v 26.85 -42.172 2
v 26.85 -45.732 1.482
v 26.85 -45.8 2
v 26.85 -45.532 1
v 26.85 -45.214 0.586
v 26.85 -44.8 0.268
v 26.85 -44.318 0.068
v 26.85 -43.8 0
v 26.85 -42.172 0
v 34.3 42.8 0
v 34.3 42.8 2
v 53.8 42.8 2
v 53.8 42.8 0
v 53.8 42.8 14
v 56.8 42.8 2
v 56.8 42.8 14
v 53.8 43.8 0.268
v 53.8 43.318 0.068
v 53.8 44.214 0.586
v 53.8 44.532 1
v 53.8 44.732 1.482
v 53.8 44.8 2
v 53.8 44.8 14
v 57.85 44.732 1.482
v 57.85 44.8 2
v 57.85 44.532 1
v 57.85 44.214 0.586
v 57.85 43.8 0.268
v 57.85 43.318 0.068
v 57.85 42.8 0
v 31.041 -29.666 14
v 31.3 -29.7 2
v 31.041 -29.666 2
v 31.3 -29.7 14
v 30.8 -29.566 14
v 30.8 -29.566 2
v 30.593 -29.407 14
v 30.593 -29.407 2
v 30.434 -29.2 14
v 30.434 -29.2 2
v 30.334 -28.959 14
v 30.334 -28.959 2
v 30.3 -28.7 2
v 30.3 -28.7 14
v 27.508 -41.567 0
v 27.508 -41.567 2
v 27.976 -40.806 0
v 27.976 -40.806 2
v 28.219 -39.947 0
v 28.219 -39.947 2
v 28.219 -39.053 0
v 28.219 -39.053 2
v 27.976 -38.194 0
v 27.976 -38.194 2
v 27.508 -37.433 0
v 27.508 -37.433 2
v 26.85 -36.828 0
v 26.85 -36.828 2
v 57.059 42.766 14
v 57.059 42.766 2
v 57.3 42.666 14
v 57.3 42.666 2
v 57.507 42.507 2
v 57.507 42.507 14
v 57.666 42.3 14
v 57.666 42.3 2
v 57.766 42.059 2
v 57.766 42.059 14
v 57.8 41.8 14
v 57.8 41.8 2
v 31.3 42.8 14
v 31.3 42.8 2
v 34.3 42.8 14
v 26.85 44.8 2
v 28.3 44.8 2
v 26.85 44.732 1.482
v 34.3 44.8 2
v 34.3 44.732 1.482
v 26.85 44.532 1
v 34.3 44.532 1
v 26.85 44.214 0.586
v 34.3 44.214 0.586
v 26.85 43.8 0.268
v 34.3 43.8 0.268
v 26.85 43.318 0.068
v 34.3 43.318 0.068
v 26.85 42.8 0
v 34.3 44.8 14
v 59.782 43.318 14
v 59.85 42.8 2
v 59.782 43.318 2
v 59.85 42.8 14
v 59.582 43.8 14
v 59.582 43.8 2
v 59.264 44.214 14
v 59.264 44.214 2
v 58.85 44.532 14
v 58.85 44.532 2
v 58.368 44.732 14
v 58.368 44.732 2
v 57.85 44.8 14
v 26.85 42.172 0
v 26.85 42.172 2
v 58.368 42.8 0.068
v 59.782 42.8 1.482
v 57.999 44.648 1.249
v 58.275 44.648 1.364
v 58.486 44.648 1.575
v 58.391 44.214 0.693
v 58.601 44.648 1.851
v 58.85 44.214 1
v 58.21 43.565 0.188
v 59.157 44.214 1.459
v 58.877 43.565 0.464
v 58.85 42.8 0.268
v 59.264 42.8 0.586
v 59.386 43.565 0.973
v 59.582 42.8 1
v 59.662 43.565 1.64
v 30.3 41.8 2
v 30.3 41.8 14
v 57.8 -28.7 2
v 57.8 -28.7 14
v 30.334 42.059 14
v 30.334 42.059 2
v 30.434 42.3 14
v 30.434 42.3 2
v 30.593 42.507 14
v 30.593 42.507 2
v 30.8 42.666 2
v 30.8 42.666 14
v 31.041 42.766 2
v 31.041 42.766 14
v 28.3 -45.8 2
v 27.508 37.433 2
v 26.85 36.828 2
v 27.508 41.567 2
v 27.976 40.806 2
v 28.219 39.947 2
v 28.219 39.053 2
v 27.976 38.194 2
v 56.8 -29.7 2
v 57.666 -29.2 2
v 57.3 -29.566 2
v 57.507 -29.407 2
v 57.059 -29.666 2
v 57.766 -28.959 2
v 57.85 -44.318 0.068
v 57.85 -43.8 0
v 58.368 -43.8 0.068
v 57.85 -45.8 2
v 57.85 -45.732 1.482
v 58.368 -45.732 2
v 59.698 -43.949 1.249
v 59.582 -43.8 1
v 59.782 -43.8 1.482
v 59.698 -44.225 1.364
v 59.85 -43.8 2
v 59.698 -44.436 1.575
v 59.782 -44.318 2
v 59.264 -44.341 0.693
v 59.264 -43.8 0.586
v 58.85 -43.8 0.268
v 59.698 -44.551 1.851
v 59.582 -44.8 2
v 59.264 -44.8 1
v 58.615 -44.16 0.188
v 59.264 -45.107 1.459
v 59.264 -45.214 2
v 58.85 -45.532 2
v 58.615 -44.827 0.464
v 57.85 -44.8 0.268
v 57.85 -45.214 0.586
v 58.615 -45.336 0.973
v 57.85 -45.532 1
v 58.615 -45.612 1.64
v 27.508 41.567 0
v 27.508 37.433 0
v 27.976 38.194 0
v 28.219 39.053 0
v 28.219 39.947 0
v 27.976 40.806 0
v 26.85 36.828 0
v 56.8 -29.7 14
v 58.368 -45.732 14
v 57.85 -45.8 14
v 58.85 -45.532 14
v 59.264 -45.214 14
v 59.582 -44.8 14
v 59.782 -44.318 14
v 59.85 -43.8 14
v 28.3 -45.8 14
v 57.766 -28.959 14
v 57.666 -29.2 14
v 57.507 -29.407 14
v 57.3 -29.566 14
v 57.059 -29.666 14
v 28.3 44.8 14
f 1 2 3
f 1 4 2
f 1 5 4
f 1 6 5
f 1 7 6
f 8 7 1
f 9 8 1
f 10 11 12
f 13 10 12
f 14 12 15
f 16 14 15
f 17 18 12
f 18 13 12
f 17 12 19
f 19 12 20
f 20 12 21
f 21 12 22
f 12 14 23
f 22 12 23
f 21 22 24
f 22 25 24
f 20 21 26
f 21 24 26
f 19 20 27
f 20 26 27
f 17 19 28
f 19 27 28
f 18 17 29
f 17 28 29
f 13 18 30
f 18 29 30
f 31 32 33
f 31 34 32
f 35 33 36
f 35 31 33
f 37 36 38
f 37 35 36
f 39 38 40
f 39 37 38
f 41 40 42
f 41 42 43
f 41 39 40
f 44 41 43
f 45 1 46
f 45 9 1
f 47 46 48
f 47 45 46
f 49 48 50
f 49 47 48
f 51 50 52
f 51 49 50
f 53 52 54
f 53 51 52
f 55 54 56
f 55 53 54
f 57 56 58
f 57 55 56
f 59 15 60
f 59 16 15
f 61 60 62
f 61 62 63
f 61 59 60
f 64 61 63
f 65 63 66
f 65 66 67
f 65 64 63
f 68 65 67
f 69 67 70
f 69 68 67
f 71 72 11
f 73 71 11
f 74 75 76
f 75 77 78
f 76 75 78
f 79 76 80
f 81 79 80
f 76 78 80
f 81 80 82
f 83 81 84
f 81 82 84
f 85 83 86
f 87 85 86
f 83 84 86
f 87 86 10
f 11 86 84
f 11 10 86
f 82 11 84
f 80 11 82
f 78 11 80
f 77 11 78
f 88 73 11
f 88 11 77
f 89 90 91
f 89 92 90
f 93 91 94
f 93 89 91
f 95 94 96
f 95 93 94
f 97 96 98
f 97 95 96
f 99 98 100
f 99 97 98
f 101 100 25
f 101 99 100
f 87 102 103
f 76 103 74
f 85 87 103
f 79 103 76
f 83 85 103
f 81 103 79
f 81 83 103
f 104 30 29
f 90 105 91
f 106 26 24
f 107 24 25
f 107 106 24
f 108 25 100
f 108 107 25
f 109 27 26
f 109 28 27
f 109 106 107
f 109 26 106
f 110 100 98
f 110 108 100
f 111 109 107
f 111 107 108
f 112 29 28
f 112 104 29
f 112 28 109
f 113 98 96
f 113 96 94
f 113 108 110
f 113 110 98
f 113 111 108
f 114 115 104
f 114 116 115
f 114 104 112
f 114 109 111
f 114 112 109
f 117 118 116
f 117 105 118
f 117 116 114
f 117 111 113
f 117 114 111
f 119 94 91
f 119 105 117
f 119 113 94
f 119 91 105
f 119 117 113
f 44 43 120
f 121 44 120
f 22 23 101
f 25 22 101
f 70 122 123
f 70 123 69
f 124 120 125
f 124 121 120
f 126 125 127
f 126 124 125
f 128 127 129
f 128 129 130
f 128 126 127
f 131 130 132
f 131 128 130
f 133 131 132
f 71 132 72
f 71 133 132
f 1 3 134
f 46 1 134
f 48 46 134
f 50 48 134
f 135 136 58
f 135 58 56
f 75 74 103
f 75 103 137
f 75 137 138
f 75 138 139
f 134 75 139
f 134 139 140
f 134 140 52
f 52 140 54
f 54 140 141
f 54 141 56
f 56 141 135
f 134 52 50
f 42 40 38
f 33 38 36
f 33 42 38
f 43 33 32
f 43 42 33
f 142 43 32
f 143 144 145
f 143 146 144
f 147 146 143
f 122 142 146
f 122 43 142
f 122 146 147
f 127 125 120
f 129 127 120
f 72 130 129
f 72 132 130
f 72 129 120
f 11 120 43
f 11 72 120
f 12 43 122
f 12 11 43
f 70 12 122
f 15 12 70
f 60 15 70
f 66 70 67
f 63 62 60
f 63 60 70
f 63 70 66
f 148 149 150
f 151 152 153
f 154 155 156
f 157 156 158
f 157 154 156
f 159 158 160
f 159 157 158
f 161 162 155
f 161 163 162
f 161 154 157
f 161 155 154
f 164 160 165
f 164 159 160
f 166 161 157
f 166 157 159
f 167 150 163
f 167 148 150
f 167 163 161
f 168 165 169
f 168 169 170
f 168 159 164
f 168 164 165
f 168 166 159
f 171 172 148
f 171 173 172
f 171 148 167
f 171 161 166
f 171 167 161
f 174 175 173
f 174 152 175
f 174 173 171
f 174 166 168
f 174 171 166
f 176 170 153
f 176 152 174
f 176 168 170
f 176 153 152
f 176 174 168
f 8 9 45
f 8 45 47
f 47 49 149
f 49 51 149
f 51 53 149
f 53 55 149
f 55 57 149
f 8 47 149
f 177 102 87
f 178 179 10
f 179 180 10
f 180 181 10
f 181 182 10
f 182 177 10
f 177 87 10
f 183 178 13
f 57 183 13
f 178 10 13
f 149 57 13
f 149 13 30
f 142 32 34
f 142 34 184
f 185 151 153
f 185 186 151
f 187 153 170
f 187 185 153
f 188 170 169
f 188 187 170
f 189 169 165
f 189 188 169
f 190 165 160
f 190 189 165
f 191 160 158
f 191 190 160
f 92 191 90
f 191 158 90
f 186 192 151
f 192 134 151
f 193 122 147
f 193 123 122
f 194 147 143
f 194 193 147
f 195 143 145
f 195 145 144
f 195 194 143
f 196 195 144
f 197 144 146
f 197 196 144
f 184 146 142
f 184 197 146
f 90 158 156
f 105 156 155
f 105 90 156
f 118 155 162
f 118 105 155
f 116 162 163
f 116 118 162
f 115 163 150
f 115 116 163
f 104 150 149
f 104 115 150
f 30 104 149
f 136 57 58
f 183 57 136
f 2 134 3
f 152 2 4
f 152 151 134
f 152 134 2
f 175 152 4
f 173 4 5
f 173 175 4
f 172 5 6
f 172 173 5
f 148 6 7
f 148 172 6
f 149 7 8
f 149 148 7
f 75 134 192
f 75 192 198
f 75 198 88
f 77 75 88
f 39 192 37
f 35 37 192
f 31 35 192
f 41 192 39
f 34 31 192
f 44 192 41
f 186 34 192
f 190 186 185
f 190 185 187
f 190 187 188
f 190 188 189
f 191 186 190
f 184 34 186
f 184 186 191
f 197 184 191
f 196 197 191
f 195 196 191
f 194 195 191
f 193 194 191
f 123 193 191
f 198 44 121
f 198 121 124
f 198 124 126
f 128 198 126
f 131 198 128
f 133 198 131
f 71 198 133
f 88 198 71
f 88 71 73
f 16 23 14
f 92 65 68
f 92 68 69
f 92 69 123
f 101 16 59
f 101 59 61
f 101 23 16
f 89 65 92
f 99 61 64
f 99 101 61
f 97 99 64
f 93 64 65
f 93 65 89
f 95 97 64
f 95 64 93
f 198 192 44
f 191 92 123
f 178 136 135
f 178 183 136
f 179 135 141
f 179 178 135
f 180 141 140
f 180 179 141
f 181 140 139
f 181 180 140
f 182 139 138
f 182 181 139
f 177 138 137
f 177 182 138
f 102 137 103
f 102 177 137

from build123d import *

# Parameters (mm, degrees)
SKETCH_W             = 33
SKETCH_H             = 90.6
PAD_DEPTH            = 2
SKETCH001_W          = 31.55
SKETCH001_H          = 90.6
PAD001_DEPTH         = 14
SKETCH002_W          = 27.5
SKETCH002_H          = 72.5
POCKET_DEPTH         = 12.001
SKETCH003_W          = 19.5
SKETCH003_H          = 7.2
POCKET001_DEPTH      = 2.001
POCKET001_DEPTH_BACK = -12.001
SKETCH004_R          = 3.25
POCKET002_DEPTH      = 2
FILLET_R             = 2
FILLET001_R          = 1


with BuildPart() as part:
    # Sketch → Pad (new body)
    with BuildSketch(Plane.XY):
        with Locations((43.35, -0.5)):
            Rectangle(SKETCH_W, SKETCH_H)
    extrude(amount=PAD_DEPTH)

    # Sketch001 → Pad001 (join)
    with BuildSketch(Plane.XY):
        with Locations((44.075, -0.5)):
            Rectangle(SKETCH001_W, SKETCH001_H)
    extrude(amount=PAD001_DEPTH)

    # Sketch002 (on DatumPlane) → Pocket (cut, through all)
    with BuildSketch(Plane.XY.offset(2)):
        with Locations((44.05, 6.55)):
            Rectangle(SKETCH002_W, SKETCH002_H)
    extrude(amount=POCKET_DEPTH, mode=Mode.SUBTRACT)

    # Sketch003 (on DatumPlane) → Pocket001 (cut, two sides)
    with BuildSketch(Plane.XY.offset(2)) as pocket001_sk:
        with Locations((44.05, 46.4)):
            Rectangle(SKETCH003_W, SKETCH003_H)
    extrude(amount=-POCKET001_DEPTH, mode=Mode.SUBTRACT)
    extrude(pocket001_sk.sketch, amount=-POCKET001_DEPTH_BACK, mode=Mode.SUBTRACT)

    # Sketch004 → Pocket002 (cut)
    with BuildSketch(Plane.XY):
        with Locations((25, 39.5)):
            Circle(SKETCH004_R)
        with Locations((25, -39.5)):
            Circle(SKETCH004_R)
    extrude(amount=POCKET002_DEPTH, mode=Mode.SUBTRACT)

    # Fillet
    fillet_edges = [part.edges().sort_by_distance(p)[0] for p in [
        (43.35, -45.8, 0),
        (59.85, -0.5, 0),
        (56.825, 44.8, 0),
        (30.575, 44.8, 0),
        (59.85, -45.8, 7),
        (59.85, 44.8, 7),
    ]]
    fillet(fillet_edges, radius=FILLET_R)

    # Fillet001
    fillet001_edges = [part.edges().sort_by_distance(p)[0] for p in [
        (30.3, -29.7, 8),
        (57.8, -29.7, 8),
        (57.8, 42.8, 8),
        (30.3, 42.8, 8),
    ]]
    fillet(fillet001_edges, radius=FILLET001_R)


solid = part.part
